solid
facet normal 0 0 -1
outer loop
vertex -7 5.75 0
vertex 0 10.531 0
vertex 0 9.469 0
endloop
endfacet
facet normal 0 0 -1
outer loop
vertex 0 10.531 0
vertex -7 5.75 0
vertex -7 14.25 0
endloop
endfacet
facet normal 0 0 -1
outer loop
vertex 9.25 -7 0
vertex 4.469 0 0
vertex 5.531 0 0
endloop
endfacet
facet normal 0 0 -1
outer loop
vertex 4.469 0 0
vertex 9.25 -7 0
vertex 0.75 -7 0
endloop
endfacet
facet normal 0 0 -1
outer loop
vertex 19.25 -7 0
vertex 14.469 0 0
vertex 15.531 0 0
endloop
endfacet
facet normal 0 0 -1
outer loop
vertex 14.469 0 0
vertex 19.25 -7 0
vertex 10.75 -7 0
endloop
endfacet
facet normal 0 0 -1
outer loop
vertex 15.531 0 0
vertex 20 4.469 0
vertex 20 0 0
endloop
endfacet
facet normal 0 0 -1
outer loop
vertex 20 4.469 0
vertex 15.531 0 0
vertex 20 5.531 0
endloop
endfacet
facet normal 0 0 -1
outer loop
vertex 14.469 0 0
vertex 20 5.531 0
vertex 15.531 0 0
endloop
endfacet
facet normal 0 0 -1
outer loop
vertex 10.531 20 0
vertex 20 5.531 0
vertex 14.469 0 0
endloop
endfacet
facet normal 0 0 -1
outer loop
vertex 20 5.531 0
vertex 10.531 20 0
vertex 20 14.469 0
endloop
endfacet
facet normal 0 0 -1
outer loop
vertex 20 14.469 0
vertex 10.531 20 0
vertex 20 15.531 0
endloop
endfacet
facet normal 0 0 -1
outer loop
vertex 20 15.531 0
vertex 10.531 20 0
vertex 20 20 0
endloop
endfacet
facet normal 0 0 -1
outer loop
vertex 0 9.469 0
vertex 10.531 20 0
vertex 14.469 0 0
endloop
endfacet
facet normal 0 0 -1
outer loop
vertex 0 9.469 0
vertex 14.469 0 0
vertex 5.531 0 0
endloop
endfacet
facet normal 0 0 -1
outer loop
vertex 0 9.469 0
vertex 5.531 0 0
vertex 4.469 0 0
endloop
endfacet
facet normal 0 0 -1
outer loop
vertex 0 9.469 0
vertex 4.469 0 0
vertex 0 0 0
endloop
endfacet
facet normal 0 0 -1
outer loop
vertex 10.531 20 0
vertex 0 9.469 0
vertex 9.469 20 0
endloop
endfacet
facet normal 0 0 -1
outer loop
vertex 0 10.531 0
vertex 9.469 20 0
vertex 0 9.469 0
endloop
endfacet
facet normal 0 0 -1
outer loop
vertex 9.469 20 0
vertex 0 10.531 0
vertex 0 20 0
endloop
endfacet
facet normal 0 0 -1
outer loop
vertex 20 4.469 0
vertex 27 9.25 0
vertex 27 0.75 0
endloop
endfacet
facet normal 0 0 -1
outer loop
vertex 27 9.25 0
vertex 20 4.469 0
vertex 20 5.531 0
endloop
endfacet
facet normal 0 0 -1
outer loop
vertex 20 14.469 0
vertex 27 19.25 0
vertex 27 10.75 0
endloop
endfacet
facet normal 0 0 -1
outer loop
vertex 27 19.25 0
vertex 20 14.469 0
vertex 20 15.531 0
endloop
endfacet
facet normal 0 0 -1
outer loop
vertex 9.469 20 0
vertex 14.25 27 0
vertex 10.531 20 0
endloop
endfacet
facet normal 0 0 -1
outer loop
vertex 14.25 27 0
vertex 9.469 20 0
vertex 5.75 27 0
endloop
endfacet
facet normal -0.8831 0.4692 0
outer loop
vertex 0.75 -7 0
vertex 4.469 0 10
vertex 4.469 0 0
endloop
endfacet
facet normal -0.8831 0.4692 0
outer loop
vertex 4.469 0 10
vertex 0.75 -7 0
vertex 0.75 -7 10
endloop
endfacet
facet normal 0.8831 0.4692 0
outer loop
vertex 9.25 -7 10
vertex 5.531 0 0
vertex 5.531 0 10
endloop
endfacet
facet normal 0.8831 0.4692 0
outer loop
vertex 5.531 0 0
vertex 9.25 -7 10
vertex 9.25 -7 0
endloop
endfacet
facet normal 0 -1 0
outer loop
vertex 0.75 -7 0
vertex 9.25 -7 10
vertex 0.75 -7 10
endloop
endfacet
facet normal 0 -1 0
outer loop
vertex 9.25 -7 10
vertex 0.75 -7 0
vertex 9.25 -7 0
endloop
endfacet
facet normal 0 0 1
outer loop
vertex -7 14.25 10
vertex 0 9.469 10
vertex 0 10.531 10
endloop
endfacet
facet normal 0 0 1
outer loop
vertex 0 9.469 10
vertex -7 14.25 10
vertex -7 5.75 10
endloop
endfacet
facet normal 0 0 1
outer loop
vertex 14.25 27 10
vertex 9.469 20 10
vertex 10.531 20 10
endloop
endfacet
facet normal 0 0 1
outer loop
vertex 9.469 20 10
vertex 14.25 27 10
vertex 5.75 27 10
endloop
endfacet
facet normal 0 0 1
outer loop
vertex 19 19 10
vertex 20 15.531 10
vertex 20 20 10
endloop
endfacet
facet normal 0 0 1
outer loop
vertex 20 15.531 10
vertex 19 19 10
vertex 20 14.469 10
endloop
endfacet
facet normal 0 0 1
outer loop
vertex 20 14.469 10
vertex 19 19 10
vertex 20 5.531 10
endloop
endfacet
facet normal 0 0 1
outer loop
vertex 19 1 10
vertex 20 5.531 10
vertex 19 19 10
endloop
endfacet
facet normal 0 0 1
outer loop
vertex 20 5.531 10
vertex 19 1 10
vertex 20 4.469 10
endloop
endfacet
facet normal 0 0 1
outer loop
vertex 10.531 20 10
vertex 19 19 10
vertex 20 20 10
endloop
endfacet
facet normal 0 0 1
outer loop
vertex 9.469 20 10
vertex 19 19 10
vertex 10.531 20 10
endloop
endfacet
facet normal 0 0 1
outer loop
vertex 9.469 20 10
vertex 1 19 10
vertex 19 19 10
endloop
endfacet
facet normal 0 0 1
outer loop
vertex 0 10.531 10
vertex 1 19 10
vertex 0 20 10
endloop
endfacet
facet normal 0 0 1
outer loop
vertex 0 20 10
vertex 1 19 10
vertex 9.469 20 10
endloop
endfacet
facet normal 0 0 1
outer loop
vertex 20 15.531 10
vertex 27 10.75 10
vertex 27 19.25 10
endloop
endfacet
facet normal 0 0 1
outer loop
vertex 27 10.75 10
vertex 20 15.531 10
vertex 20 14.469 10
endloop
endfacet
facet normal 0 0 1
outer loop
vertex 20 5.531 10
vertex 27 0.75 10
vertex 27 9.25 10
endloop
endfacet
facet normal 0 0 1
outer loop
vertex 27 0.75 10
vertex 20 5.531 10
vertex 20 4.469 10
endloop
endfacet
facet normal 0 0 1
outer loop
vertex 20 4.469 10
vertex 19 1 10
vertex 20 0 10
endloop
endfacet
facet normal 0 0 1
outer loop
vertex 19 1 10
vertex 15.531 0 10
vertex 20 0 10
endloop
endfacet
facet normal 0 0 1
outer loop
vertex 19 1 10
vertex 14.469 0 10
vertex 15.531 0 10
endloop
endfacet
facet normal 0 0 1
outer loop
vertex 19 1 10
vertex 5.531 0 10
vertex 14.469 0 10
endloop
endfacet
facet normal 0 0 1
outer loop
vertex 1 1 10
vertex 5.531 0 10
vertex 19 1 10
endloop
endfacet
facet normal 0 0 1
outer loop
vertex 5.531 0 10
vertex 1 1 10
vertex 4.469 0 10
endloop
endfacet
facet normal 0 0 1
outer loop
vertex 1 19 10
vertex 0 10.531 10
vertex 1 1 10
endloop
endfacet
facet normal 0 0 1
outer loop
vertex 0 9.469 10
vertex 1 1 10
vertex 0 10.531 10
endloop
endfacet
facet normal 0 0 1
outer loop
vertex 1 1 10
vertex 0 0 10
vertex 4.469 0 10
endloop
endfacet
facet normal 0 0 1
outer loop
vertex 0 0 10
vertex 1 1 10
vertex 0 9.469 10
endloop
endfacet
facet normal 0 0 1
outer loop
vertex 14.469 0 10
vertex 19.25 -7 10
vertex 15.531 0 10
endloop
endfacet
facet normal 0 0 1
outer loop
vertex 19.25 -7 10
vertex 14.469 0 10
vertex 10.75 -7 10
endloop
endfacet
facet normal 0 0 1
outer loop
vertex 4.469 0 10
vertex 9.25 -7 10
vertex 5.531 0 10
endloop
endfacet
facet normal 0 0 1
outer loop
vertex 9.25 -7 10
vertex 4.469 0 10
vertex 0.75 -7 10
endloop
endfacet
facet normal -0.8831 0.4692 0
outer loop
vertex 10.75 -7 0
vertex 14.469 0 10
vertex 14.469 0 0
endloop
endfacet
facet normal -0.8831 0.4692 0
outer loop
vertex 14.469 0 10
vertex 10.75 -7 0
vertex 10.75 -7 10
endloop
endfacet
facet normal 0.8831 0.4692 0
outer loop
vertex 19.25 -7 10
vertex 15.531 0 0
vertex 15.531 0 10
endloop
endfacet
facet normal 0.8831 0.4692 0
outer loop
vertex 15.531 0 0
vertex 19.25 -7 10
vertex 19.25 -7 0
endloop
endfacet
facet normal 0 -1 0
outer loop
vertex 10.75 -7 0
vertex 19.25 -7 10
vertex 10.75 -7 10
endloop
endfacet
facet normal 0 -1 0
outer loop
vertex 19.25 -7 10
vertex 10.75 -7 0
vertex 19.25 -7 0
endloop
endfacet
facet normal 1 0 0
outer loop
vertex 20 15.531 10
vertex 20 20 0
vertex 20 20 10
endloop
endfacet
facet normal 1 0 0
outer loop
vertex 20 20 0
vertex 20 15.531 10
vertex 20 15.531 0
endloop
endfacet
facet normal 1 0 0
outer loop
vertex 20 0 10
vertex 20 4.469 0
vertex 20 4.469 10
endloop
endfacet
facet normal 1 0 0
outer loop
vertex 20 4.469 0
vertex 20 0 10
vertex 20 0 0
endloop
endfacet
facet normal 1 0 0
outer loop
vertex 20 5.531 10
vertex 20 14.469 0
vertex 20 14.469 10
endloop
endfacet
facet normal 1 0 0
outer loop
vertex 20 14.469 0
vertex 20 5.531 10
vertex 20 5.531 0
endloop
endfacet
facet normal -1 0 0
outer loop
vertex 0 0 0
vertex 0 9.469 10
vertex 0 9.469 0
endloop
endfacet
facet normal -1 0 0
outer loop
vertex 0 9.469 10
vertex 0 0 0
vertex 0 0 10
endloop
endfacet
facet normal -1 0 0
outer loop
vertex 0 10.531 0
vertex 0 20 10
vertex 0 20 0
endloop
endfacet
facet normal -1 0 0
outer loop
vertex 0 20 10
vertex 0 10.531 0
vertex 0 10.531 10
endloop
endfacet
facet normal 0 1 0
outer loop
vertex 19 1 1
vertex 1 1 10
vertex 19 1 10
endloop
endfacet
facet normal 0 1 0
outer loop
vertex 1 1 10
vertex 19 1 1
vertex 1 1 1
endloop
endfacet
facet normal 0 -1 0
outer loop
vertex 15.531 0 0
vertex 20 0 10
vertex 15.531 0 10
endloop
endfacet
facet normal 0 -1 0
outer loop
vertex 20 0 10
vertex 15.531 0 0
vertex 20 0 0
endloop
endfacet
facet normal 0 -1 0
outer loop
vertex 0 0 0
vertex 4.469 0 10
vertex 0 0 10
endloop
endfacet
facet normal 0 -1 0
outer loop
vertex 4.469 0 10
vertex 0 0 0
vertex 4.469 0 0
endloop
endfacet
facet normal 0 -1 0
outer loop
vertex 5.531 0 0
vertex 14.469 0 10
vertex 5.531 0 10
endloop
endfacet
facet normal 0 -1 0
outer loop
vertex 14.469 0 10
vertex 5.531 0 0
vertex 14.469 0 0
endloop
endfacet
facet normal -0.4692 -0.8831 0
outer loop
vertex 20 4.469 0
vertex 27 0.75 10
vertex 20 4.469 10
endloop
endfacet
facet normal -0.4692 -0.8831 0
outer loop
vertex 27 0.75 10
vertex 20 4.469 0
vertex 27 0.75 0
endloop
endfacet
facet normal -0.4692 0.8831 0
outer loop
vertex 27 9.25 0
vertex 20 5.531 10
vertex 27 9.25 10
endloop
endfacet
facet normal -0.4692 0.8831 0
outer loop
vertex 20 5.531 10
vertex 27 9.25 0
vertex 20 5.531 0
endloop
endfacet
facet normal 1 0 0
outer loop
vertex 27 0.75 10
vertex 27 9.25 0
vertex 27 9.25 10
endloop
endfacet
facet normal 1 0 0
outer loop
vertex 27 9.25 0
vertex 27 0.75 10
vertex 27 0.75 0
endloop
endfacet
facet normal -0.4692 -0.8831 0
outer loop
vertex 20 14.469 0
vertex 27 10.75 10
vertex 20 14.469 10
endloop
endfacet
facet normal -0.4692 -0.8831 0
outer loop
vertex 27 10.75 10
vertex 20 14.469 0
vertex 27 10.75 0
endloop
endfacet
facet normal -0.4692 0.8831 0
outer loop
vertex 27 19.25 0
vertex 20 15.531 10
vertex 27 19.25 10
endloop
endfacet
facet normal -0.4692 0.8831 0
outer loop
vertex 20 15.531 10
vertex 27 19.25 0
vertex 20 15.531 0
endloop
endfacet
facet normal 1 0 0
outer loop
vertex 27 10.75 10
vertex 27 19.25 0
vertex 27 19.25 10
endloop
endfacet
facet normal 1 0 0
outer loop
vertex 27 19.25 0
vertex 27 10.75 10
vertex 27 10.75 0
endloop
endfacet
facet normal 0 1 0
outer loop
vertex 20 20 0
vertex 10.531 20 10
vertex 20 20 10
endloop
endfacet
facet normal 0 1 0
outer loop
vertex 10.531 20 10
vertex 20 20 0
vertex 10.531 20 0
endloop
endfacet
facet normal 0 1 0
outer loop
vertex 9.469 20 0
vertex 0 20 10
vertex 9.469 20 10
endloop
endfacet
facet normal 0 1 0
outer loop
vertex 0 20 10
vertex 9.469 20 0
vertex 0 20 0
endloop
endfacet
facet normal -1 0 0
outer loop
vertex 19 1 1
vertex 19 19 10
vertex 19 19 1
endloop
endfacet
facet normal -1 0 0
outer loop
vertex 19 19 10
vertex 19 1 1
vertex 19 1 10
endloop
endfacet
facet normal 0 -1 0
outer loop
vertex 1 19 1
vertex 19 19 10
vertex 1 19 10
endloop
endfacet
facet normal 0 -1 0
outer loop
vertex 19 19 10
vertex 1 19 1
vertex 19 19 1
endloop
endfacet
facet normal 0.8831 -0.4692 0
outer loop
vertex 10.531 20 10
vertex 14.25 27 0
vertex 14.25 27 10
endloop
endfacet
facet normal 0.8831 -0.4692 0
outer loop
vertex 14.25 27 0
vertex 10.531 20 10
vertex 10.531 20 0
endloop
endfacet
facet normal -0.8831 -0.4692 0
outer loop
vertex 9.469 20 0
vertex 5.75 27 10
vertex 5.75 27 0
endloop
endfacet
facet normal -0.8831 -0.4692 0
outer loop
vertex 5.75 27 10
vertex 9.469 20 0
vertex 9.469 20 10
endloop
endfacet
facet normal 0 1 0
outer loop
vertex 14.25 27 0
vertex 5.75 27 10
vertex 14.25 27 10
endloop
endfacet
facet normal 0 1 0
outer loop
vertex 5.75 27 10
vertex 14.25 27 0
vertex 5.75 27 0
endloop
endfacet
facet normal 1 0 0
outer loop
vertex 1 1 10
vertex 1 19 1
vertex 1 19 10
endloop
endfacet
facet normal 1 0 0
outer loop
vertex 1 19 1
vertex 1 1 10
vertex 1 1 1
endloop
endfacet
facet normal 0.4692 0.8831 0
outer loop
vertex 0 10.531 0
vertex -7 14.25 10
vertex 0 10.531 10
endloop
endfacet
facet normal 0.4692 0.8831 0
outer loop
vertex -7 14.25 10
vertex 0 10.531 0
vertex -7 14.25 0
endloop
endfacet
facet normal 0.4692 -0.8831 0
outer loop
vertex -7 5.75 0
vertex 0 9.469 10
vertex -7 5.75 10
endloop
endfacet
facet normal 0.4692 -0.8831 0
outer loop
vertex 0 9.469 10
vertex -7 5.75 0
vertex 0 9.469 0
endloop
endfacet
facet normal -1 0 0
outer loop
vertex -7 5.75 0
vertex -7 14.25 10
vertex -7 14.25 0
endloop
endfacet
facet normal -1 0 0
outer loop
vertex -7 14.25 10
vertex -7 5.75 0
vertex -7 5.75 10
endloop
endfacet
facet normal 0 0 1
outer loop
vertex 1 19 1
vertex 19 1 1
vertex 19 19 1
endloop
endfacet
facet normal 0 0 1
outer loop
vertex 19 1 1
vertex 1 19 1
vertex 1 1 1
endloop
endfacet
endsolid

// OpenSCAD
/* [Size] */

length = 1;
width = 1;
height = 10;

/* [Hidden] */

size = [length, width, height];

module 3DTriangle(size) {
    polyhedron(
        points = [
            [0, 0, 0], //0
            [size[0]/2, size[1], 0], //1
            [size[0], 0, 0], //2
            [0, 0, size[2]], //3
            [size[0]/2, size[1], size[2]], //4
            [size[0], 0, size[2]] //5
        ], faces = [
            [0, 1, 2], //bottom
            [0, 3, 4, 1], //s1
            [1, 4, 5, 2], //s2
            [2, 5, 3, 0], //s3
            [5, 4, 3] //top
        ]
    );
}

module genSide(type, h) {
    if (type==0) {
        cube([20, 1, h]);
        for (i = [0:1]) {
            translate([i*10+0.75, -7, 0]) {
                3DTriangle([8.5, 8, h]);
            }
        }
    } else if (type==1) {
        cube([20, 1, h]);
        translate([5.75, -7, 0]) {
            3DTriangle([8.5, 8, h]);
        }
    }
}

module genSides(type, h, count) {
    for (i = [0:20:(count-1)*20]) {
        translate([i, 0, 0]) {
            genSide(type, h);
        }
    }
}

module genContainer(size) {
    cube([size[0]*20, size[1]*20, 1]);
    for (i = [0:3]) {
        if (i==0) {
            genSides(0, size[2], size[0]);
        } else if (i==1) {
            rotate([0, 0, 90]) {
                translate([0, -size[0]*20, 0]) {
                    genSides(0, size[2], size[1]);
                }
            }
        } else if (i==2) {
            rotate([0, 0, 180]) {
                translate([-size[0]*20, -size[1]*20, 0]) {
                    genSides(1, size[2], size[0]);
                }
            }
        } else if (i==3) {
            rotate([0, 0, 270]) {
                translate([-size[1]*20, 0, 0]) {
                    genSides(1, size[2], size[1]);
                }
            }
        }
    }
}

genContainer(size);
